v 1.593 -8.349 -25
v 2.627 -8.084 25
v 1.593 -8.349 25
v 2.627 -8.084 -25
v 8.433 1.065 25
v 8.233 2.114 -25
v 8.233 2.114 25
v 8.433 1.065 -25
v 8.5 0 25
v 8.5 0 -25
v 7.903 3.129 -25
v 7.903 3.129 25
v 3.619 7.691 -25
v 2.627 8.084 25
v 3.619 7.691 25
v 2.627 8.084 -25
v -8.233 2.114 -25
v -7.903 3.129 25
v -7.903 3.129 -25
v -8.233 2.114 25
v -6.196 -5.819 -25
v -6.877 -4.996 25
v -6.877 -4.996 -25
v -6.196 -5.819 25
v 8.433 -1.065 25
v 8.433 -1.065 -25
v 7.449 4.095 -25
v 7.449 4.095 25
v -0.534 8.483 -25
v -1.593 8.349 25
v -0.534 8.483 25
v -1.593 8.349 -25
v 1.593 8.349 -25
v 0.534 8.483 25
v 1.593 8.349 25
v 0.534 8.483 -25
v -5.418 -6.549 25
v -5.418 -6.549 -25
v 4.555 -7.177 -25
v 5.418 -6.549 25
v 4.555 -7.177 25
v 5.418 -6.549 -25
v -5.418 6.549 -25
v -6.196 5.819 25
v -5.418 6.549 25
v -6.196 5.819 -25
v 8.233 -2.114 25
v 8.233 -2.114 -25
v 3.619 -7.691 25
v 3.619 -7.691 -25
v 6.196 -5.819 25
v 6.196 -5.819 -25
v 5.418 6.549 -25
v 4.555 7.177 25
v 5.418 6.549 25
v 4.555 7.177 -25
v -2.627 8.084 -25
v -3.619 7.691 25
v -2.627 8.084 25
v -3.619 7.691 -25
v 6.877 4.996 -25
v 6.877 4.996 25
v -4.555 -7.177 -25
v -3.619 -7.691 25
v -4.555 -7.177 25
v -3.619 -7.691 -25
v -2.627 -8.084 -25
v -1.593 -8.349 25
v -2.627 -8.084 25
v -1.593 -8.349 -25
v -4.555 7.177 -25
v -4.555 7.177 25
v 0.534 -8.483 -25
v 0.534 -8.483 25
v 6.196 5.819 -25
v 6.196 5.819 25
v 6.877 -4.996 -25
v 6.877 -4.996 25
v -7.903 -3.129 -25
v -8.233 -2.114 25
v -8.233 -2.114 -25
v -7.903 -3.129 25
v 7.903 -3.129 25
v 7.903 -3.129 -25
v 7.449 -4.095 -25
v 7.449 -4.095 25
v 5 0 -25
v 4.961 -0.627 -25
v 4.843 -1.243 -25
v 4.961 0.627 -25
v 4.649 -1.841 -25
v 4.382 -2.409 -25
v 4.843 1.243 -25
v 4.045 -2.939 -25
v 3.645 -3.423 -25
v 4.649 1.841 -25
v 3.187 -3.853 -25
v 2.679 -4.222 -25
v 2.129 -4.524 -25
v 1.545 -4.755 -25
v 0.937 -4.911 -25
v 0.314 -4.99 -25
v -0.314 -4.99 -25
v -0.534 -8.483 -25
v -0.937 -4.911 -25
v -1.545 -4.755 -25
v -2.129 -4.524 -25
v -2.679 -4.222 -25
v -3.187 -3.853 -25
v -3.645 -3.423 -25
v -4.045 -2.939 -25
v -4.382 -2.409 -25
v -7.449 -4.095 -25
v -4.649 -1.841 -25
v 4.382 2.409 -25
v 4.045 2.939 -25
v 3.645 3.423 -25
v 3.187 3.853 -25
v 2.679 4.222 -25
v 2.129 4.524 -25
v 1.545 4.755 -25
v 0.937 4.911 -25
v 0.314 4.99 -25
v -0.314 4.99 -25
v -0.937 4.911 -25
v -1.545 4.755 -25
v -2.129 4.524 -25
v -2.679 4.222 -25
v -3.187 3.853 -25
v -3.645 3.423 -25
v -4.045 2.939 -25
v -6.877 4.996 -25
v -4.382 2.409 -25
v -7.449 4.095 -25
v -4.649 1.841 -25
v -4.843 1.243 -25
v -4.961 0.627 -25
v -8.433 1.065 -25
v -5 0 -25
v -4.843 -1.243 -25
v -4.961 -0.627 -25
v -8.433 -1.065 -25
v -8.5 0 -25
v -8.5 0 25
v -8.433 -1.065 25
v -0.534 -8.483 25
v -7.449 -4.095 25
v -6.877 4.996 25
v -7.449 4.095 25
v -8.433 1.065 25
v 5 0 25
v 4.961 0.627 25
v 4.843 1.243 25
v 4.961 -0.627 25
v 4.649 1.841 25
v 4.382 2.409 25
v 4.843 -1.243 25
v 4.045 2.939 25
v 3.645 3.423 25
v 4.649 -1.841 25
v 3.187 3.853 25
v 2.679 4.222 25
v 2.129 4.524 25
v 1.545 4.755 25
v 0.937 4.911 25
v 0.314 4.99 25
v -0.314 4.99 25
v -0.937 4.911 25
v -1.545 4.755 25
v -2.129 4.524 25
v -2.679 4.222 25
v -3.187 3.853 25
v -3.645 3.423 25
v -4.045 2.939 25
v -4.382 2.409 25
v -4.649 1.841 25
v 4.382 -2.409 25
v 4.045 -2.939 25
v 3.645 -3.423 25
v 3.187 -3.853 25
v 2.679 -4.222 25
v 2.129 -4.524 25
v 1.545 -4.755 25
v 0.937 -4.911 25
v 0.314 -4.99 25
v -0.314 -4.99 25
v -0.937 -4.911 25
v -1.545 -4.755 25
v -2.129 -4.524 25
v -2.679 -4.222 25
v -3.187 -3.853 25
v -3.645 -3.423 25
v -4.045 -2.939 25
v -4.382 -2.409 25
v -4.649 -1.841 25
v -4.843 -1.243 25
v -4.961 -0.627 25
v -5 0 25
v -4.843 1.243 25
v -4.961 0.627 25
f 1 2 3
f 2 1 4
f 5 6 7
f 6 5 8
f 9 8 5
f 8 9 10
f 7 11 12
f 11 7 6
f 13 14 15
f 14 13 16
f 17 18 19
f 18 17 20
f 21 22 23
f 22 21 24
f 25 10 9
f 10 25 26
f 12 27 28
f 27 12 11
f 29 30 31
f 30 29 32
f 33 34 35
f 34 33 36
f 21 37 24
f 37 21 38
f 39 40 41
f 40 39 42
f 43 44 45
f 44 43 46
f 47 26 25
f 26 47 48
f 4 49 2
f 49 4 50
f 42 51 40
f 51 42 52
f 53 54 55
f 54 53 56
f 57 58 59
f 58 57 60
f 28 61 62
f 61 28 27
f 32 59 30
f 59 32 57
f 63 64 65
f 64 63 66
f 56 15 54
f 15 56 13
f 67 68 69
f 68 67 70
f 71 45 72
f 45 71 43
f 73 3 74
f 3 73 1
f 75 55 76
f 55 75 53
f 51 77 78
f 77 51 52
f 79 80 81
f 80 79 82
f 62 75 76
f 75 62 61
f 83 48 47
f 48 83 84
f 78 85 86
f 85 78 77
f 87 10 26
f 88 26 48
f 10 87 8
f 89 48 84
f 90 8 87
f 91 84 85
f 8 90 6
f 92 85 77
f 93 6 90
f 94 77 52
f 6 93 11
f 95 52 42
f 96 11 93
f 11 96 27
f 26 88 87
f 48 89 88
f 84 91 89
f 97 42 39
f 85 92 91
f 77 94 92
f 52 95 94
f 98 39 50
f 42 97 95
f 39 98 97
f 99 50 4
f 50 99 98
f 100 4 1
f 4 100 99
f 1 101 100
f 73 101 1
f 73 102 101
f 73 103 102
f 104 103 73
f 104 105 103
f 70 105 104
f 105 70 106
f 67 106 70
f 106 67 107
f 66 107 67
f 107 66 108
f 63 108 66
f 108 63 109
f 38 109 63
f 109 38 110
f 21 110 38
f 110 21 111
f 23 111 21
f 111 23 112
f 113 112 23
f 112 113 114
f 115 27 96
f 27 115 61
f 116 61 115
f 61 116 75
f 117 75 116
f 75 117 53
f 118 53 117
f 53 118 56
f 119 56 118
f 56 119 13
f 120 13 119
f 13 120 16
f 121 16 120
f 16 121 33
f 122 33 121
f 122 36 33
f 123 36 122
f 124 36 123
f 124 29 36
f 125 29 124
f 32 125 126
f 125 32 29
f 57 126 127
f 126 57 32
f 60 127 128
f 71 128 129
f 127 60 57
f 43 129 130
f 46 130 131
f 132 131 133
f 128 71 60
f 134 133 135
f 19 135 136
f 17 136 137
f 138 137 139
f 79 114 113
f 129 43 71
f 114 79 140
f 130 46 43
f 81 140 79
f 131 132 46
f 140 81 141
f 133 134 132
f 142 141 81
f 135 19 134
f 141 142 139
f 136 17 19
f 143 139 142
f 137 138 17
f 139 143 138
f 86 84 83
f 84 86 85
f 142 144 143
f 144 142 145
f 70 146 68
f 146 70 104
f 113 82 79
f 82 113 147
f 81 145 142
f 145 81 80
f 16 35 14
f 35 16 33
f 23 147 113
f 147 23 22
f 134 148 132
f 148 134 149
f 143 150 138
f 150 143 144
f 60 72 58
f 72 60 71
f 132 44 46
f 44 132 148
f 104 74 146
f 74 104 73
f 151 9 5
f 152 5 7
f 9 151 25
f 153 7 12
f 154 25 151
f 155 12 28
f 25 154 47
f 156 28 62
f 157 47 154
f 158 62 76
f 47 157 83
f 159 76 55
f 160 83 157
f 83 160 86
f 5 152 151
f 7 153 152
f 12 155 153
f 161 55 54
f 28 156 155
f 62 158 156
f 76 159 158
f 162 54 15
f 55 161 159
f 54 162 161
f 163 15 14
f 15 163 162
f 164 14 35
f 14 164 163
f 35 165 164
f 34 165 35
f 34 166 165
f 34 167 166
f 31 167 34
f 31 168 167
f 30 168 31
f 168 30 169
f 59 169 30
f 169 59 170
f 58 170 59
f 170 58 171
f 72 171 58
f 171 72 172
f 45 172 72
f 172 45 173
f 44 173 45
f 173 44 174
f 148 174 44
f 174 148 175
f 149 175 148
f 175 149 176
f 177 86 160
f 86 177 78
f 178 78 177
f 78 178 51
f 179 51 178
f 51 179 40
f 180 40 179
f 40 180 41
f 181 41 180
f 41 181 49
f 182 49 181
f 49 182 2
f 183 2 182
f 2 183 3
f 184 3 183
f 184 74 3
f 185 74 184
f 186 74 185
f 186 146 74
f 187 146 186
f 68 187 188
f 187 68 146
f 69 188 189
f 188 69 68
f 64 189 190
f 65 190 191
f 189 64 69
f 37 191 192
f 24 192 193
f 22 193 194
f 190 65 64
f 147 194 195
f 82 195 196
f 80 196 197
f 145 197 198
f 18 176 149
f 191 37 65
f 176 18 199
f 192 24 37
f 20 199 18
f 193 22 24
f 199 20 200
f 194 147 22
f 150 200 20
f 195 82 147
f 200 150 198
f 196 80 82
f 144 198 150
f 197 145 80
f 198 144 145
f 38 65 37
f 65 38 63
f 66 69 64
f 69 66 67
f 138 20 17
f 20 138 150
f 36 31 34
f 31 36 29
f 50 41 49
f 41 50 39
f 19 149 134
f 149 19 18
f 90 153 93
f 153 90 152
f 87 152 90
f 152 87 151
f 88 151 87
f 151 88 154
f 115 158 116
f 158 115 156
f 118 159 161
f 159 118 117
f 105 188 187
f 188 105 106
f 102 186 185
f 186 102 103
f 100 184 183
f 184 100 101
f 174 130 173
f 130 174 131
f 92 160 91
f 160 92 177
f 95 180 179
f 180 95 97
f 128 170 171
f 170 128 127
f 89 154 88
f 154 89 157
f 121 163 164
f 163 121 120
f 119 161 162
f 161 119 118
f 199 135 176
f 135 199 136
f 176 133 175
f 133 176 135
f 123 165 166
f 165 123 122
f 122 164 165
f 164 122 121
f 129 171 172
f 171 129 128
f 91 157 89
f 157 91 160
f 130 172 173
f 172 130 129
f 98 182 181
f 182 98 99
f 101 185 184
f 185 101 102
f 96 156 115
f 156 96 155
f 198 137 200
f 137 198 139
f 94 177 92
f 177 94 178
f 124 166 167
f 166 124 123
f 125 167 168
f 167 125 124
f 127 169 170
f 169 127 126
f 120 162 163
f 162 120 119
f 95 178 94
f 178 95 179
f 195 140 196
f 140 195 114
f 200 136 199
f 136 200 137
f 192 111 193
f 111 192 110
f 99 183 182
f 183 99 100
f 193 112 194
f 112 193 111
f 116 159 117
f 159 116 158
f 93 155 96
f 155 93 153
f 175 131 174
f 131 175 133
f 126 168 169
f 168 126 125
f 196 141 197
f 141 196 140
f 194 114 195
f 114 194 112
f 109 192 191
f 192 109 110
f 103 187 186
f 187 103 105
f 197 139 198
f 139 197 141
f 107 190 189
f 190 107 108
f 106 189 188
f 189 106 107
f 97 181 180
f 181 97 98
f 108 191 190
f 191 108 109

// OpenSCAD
$fn = 50;


difference() {
	union() {
		translate(v = [0, 0, -25.0000000000]) {
			cylinder(h = 50, r = 8.5000000000);
		}
	}
	union() {
		translate(v = [0, 0, -100.0000000000]) {
			cylinder(h = 200, r = 5.0000000000);
		}
	}
}
